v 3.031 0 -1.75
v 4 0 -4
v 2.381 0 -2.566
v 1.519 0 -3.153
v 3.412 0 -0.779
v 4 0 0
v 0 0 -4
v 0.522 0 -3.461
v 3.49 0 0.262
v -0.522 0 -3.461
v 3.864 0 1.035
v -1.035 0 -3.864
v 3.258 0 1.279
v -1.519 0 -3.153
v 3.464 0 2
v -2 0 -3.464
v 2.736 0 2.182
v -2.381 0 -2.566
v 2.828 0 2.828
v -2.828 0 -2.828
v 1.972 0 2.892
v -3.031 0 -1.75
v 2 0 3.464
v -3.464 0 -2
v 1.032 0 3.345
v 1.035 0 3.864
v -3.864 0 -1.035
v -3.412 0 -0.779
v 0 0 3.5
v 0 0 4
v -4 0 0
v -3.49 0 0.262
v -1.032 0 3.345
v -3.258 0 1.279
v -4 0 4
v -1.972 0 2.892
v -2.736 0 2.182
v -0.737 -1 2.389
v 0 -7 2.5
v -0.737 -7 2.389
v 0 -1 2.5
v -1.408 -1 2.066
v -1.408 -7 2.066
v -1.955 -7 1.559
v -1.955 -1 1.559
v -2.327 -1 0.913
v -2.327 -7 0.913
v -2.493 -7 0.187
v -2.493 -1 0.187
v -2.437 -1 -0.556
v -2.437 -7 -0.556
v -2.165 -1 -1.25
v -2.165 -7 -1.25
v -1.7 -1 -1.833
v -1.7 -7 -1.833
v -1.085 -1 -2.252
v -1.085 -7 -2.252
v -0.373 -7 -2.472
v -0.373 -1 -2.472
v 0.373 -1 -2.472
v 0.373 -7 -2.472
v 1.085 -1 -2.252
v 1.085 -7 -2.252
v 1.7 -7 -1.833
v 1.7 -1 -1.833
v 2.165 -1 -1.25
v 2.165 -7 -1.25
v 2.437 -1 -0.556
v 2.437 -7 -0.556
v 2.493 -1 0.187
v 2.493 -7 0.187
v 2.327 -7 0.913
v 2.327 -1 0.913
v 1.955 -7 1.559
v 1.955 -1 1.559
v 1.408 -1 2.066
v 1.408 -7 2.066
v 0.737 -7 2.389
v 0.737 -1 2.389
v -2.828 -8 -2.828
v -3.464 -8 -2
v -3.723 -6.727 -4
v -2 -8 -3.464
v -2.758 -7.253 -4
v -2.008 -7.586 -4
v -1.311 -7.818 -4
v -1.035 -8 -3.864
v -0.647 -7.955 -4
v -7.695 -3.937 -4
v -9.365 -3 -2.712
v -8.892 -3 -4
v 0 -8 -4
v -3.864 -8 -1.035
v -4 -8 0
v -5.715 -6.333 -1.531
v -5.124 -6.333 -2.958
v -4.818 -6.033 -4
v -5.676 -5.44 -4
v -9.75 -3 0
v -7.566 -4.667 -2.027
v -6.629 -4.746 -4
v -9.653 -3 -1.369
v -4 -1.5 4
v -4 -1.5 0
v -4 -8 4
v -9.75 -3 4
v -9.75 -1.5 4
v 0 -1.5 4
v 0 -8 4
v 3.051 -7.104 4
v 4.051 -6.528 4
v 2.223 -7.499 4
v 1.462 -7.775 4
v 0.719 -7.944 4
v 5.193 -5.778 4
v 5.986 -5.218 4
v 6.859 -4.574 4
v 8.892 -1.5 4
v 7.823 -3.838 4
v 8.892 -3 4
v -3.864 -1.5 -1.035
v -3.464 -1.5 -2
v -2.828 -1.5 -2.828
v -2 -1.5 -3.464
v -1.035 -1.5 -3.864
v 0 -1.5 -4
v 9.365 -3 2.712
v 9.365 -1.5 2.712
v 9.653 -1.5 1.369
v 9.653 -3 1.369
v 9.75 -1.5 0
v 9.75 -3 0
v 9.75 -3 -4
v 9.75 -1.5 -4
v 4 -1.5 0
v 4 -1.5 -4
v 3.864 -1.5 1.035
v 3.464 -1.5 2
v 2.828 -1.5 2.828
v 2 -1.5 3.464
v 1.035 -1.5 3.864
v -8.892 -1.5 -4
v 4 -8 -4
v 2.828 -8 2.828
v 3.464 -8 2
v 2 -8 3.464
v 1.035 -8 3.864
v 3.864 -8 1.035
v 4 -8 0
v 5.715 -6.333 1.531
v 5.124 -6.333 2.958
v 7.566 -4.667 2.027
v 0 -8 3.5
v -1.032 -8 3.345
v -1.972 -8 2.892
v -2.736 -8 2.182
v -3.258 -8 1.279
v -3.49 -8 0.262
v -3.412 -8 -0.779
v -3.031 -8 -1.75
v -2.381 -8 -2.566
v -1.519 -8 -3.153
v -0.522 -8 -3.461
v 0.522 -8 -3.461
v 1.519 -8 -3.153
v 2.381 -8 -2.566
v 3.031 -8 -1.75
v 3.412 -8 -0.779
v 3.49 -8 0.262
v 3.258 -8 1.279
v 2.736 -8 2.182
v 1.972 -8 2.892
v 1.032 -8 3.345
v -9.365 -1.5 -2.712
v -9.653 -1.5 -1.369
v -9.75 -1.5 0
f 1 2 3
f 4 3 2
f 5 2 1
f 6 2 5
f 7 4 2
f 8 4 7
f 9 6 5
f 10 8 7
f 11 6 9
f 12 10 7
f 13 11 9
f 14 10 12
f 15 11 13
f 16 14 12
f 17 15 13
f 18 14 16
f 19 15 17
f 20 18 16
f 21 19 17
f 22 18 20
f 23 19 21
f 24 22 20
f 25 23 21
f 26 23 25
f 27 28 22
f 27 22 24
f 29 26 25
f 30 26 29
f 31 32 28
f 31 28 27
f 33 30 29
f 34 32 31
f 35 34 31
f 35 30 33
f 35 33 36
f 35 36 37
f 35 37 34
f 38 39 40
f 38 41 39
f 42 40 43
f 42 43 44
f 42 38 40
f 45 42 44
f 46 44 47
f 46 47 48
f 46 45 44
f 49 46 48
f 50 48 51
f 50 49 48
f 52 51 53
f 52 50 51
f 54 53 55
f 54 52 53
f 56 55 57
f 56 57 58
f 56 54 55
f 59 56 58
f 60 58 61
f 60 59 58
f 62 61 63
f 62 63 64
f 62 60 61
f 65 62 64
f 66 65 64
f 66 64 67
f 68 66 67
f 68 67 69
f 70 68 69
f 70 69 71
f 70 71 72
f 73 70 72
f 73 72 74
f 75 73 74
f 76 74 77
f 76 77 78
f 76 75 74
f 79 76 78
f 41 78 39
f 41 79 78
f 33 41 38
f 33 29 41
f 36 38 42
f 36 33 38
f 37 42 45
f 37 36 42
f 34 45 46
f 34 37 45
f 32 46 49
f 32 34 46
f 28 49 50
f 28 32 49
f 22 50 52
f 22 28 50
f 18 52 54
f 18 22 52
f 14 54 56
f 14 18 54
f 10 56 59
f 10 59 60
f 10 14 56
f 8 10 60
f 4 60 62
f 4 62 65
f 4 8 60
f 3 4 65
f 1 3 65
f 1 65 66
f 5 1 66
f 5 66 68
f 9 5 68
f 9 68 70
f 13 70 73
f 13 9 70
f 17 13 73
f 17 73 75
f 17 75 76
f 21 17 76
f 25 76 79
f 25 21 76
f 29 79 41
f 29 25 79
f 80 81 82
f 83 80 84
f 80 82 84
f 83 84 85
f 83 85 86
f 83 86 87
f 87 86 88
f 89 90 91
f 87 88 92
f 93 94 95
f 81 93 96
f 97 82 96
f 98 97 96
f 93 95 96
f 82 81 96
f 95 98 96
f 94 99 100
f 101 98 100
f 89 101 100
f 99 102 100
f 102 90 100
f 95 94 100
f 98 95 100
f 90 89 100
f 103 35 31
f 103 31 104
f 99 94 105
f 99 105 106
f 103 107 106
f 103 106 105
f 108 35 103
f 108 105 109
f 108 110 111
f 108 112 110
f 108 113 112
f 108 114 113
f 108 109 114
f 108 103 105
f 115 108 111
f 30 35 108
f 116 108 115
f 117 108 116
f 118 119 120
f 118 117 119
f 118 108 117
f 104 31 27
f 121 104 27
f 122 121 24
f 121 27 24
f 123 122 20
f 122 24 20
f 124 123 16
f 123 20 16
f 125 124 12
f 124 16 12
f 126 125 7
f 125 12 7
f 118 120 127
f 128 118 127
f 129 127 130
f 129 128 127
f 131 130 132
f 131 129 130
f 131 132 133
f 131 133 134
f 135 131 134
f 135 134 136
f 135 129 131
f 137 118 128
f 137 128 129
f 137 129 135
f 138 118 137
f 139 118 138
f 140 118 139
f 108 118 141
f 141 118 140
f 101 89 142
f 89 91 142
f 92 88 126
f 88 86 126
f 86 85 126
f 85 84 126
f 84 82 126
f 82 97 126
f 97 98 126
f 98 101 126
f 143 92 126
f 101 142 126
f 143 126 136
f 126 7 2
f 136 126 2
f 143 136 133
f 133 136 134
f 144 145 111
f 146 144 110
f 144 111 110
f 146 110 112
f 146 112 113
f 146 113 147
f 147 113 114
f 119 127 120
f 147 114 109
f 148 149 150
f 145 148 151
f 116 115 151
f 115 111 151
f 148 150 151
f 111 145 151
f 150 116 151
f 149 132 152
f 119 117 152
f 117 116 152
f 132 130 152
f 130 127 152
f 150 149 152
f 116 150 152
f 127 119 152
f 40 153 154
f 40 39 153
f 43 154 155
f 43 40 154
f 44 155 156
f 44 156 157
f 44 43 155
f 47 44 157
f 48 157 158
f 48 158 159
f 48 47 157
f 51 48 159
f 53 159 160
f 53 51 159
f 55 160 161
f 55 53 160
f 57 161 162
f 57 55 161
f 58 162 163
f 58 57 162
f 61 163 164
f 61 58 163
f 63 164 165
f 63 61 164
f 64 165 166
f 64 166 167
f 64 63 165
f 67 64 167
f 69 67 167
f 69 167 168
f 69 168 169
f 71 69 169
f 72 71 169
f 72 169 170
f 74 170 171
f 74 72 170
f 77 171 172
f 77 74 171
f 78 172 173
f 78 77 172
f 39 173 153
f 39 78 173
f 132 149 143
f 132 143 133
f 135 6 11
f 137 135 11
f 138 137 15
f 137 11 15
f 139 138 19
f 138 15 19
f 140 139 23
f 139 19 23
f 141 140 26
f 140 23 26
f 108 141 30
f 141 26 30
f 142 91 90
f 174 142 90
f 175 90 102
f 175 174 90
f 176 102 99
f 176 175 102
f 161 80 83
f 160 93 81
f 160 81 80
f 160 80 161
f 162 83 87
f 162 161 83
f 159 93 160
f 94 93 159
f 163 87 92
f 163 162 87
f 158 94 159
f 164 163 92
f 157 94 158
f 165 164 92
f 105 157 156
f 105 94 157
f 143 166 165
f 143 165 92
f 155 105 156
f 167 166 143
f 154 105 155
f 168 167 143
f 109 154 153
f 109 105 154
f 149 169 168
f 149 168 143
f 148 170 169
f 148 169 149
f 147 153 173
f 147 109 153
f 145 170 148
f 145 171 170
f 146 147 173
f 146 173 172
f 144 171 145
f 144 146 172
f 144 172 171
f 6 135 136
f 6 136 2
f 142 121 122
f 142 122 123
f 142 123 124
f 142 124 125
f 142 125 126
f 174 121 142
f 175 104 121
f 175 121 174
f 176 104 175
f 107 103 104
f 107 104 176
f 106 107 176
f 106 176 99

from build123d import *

# Parameters (mm, degrees)
EXTRUDE_1_DEPTH     = 4
CUT_EXTRUDE_1_DEPTH = 1.5
CUT_EXTRUDE_2_DEPTH = 7.5


with BuildPart() as part:
    # Эскиз1 → Бобышка-Вытянуть1 (new body, symmetric)
    with BuildSketch(Plane.XY):
        Polygon((4, 0), (-4, 0), (-4, -1.5), (-9.75, -1.5), (-9.75, -8), (9.75, -8), (9.75, -1.5), (4, -1.5), align=None)
    extrude(amount=EXTRUDE_1_DEPTH, both=True)

    # Эскиз3 → Отверстие обработанное метчиком M62 (revolve, cut)
    with BuildSketch(Plane(origin=(0, 0, 0), x_dir=(0, 0, 1), z_dir=(1, 0, 0))):
        Polygon((0, 0), (0, 8), (3.5, 8), (2.5, 7), (2.5, 1), (3.5, 0), align=None)
    revolve(axis=Axis((0, 6.35, 0), (0, -1, 0)), mode=Mode.SUBTRACT)

    # Эскиз4 → Вырез-Вытянуть1 (cut)
    with BuildSketch(Plane(origin=(0, 0, 0), x_dir=(1, 0, 0), z_dir=(0, 1, 0))):
        with BuildLine():
            Line((-4, 4), (-4, 0))
            ThreePointArc((-4, 0), (-2.828427125, 2.828427125), (0, 4))
            Line((0, 4), (-4, 4))
        make_face()
        with BuildLine():
            Line((0, -4), (4, -4))
            Line((4, -4), (4, 0))
            ThreePointArc((4, 0), (2.828427125, -2.828427125), (0, -4))
        make_face()
    extrude(amount=-CUT_EXTRUDE_1_DEPTH, mode=Mode.SUBTRACT)

    # Эскиз5 → Вырез-Вытянуть2 (cut, through all)
    with BuildSketch(Plane(origin=(0, -1.5, 0), x_dir=(1, 0, 0), z_dir=(0, 1, 0))):
        with BuildLine():
            Line((-9.75, 0), (-9.75, 4))
            Line((-9.75, 4), (-8.891709622, 4))
            ThreePointArc((-8.891709622, 4), (-9.533012871, 2.045523305), (-9.75, 0))
        make_face()
        with BuildLine():
            Line((9.75, 0), (9.75, -4))
            Line((9.75, -4), (8.891709622, -4))
            ThreePointArc((8.891709622, -4), (9.533012871, -2.045523305), (9.75, 0))
        make_face()
    extrude(amount=-CUT_EXTRUDE_2_DEPTH, mode=Mode.SUBTRACT)

    # Вырез-По траектории1: sweep along a path in Эскиз7
    with BuildLine(Plane.XZ.offset(8)) as sweep_1_path:
        Line((0, 9.75), (-9.75, 9.75))
        Line((-9.75, 9.75), (-9.75, 0))
        ThreePointArc((-9.75, 0), (-6.894291117, -6.894291117), (0, -9.75))
        Line((0, -9.75), (9.75, -9.75))
        Line((9.75, -9.75), (9.75, 0))
        ThreePointArc((9.75, 0), (6.894291117, 6.894291117), (0, 9.75))
    # Эскиз6 → Вырез-По траектории1 (sweep, cut)
    with BuildSketch(Plane.XY.offset(4)):
        Polygon((-9.75, -3), (-9.75, -8), (-4, -8), align=None)
    sweep(path=sweep_1_path.line, transition=Transition.RIGHT, mode=Mode.SUBTRACT)


solid = part.part
